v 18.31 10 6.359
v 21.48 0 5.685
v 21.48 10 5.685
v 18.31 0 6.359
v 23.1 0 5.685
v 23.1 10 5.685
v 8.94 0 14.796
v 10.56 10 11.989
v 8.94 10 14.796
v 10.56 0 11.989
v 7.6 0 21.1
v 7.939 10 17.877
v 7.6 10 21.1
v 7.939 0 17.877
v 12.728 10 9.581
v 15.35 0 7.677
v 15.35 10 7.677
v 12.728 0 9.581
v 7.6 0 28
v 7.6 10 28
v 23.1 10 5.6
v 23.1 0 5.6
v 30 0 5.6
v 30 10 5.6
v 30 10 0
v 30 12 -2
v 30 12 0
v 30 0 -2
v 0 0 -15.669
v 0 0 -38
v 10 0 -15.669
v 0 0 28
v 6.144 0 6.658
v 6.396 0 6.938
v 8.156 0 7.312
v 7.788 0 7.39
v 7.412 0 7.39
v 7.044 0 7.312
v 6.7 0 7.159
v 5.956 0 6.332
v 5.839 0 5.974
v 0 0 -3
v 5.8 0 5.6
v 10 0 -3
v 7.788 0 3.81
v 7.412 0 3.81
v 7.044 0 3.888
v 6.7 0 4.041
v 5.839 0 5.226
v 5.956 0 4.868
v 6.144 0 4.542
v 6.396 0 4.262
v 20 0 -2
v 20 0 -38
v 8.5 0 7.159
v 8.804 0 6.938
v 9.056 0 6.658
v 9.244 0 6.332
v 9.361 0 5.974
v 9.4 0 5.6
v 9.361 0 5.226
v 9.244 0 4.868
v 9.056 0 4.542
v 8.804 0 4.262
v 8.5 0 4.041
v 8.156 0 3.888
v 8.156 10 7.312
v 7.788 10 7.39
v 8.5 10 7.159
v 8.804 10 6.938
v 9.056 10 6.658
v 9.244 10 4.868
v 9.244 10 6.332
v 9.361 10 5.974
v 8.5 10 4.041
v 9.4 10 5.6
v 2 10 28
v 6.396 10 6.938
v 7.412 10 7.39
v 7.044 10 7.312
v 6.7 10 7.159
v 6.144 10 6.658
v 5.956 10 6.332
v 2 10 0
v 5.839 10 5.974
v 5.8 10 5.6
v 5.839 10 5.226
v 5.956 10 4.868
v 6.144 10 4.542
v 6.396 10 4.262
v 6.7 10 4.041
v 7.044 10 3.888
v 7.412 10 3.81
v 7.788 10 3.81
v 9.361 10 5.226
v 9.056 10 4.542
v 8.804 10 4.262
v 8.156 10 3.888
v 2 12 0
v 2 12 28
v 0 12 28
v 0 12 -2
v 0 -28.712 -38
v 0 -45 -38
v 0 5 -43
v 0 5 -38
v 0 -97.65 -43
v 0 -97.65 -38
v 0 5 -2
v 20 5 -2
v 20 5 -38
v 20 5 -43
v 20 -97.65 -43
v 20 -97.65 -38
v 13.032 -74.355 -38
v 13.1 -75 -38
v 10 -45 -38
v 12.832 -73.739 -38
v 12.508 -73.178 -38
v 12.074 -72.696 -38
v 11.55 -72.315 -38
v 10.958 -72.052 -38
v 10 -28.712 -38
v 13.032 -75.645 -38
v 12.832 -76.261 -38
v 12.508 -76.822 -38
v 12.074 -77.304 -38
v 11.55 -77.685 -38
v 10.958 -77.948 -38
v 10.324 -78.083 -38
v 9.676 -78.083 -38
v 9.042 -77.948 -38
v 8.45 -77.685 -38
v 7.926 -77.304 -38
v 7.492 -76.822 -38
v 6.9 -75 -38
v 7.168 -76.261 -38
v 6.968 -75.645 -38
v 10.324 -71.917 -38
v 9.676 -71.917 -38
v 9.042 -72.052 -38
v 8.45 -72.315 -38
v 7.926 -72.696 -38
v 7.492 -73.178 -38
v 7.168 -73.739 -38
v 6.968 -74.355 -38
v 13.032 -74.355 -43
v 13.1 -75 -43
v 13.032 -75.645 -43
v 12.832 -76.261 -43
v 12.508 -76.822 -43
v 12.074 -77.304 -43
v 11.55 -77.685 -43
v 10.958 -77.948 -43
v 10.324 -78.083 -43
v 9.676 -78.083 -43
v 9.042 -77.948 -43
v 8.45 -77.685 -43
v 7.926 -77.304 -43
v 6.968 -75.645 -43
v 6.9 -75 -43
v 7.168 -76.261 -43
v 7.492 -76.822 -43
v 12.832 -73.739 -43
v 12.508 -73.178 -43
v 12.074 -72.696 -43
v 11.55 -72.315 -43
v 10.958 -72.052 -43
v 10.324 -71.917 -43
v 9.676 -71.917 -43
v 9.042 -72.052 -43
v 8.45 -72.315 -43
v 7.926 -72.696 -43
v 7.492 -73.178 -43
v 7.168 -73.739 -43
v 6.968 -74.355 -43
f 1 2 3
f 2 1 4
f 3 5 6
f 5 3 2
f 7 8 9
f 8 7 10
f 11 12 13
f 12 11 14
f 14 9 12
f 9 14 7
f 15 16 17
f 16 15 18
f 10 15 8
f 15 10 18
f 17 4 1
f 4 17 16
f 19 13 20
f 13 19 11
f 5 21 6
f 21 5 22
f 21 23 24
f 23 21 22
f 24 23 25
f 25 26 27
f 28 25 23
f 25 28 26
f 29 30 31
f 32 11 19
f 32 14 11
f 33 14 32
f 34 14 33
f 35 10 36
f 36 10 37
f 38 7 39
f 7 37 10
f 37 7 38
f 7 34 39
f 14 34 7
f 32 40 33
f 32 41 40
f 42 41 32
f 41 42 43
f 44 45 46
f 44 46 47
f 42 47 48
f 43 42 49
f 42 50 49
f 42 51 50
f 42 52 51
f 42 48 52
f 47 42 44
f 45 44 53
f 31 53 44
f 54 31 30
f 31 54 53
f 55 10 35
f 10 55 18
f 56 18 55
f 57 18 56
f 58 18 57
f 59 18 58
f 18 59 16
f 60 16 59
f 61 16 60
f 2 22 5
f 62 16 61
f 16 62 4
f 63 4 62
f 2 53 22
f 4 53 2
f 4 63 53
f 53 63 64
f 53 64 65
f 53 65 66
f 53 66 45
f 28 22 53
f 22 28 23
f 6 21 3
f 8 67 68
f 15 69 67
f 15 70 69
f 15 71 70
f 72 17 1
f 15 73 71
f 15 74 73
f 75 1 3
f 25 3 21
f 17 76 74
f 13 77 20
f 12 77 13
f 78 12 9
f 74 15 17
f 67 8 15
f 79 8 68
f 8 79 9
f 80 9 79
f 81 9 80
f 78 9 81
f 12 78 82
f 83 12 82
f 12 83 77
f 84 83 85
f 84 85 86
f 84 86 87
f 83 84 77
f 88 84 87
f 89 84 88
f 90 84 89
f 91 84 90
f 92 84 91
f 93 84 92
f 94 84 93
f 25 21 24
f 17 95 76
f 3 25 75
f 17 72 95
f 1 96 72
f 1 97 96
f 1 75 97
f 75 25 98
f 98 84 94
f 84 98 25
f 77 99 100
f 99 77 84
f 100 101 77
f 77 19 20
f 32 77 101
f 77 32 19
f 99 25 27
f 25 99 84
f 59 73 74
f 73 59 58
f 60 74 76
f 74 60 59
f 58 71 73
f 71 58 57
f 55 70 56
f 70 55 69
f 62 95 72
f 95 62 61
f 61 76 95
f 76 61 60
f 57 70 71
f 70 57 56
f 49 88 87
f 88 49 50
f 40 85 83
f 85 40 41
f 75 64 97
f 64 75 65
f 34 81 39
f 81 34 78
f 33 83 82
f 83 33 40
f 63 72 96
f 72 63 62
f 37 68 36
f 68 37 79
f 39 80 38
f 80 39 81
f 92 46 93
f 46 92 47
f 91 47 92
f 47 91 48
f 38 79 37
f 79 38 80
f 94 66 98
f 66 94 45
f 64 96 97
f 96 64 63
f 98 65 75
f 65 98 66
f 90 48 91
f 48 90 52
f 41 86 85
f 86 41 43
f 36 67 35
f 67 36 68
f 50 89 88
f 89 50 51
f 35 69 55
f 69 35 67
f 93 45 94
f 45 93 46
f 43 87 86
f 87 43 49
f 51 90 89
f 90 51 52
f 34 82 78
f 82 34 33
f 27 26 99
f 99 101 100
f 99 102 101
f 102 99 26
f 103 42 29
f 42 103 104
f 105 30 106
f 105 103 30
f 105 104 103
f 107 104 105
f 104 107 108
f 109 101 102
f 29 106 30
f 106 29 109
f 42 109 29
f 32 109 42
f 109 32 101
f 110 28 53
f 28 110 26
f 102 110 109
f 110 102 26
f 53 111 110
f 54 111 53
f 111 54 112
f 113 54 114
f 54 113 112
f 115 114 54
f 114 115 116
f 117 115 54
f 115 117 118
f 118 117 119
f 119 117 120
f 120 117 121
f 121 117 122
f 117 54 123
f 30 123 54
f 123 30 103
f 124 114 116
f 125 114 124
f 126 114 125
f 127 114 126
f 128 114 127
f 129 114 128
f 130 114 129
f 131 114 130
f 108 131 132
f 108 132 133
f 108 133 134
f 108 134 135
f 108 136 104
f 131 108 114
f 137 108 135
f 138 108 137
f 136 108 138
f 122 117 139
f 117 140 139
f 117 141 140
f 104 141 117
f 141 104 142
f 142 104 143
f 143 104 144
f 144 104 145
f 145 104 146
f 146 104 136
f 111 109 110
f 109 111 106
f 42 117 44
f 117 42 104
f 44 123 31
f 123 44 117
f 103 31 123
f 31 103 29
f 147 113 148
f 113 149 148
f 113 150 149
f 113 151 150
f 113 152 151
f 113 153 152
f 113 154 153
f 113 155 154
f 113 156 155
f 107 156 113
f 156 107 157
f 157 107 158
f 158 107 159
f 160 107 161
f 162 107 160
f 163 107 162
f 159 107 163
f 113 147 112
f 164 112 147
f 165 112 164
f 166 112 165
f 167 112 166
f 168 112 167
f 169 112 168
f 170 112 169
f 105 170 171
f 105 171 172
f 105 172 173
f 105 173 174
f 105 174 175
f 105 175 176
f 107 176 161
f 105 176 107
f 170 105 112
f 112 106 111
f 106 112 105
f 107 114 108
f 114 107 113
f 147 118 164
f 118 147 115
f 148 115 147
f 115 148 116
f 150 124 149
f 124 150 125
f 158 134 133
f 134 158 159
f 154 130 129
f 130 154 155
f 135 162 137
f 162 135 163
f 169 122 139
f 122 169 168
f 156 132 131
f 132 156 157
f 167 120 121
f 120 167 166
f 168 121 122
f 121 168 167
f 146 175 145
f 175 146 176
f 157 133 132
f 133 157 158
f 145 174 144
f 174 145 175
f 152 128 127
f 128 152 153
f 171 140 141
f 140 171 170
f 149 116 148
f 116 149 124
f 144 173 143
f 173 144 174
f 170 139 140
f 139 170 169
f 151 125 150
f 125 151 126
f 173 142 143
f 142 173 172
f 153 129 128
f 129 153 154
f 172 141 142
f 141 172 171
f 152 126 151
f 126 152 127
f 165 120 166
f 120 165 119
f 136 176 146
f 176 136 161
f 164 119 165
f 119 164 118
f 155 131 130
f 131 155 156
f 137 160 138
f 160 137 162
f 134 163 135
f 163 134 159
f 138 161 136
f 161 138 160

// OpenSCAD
    // Axes correspond to the printer axes.

mm = 1;
$fs = 0.1;
epsilon = 0.01 * mm;

motor_screw_to_edge = 5.6 * mm;
motor_screw_clearance = 3.6 * mm;

motor_bracket_to_edge = 28 * mm;
motor_mount_thickness = 10 * mm;

motor_mount_lip_width = 2 * mm;
motor_mount_lip_height = 2 * mm;

motor_width = 42.2 * mm;
edge_to_shaft = motor_width / 2;
motor_shaft_clearance = 31 * mm;

motor_mount_total_width = motor_bracket_to_edge + motor_mount_lip_width;
motor_mount_total_thickness = motor_mount_thickness + motor_mount_lip_height;

motor_edge_to_lens = [ 0, -75, -10 ] * mm;
lens_to_base = [ 0, 0, -28 ] * mm;
// oops I should refactor this a bit
lens_to_base_x = -35 * mm;
mounting_screw_clearance = 6.2 * mm;

motor_to_camera_base = motor_edge_to_lens + lens_to_base;

camera_bracket_width = 20 * mm;
camera_bracket_thickness = 5 * mm;
camera_base_width = 45.3 * mm;
camera_lip = [ 6.2 * mm, camera_base_width, 7.5 * mm ];
brace_height = 35 * mm;
brace_length = 45 * mm;
brace_thickness = 10 * mm;

// Measurements for camera clearance
camera_total_width = 94 * mm;
camera_total_height = 43 * mm;
camera_total_depth = 25 * mm;
camera_overhang = 8 * mm;

module motor_mount()
{

    difference()
    {
        // Base shape
        cube([ motor_bracket_to_edge, motor_bracket_to_edge, motor_mount_thickness ]);

        // Cutout for motor shaft
        translate([ edge_to_shaft, edge_to_shaft, -epsilon ])
        {
            // Motor shaft clearance
            cylinder(h = motor_mount_thickness + 2 * epsilon, d = motor_shaft_clearance);

            // Additional cuts to make the cutout a rounded L-shape,
            // instead of a cut-off circle.
            translate([ -motor_shaft_clearance / 2, 0, 0 ])
                cube([ motor_shaft_clearance, motor_shaft_clearance / 2, motor_mount_thickness + 2 * epsilon ]);
            translate([ 0, -motor_shaft_clearance / 2, 0 ])
                cube([ motor_shaft_clearance / 2, motor_shaft_clearance, motor_mount_thickness + 2 * epsilon ]);
        }

        // Screw hole for mounting
        translate([ motor_screw_to_edge, motor_screw_to_edge, -epsilon ])
            cylinder(h = motor_mount_thickness + 2 * epsilon, d = motor_screw_clearance);
    }

    // Lip for alignment using edge of motor housing
    translate([ -motor_mount_lip_width, -motor_mount_lip_width, -motor_mount_lip_height ])
    {
        cube([ motor_mount_total_width, motor_mount_lip_width, motor_mount_total_thickness ]);
        cube([ motor_mount_lip_width, motor_mount_total_width, motor_mount_total_thickness ]);
    }
}

module brace()
{
    rotate([ 90, 0, -90 ]) linear_extrude(brace_thickness) polygon([
        [ brace_length, 0 ],
        [ 0, brace_height ],
        [ 0, brace_height - brace_thickness * sqrt(pow(brace_length, 2) + pow(brace_height, 2)) / brace_length ],
        [ brace_length - brace_thickness * sqrt(pow(brace_length, 2) + pow(brace_height, 2)) / brace_height, 0 ],
    ]);
}

module prusa_i3_x_camera()
{

    translate([ motor_mount_lip_width, motor_mount_thickness, 0 ]) rotate([ 90, 0, 0 ]) motor_mount();
    translate([ 0, 0, motor_to_camera_base[2] ])
    {
        cube([ camera_bracket_width, camera_bracket_thickness, abs(motor_to_camera_base[2]) ]);
        translate([ brace_thickness, 0, 0 ]) brace();
    }
    translate(motor_to_camera_base - [ 0, camera_base_width / 2, camera_bracket_thickness ])
    {
        difference()
        {
            cube([
                camera_bracket_width, abs(motor_to_camera_base[1]) + camera_base_width / 2 + camera_bracket_thickness,
                camera_bracket_thickness
            ]);
            translate([ camera_bracket_width / 2, camera_base_width / 2, -epsilon ])
                cylinder(d = mounting_screw_clearance, h = camera_bracket_thickness + 2 * epsilon);
        }
    }
}

module camera_model()
{
    translate(motor_to_camera_base +
              [ camera_bracket_width / 2 - lens_to_base_x - camera_total_depth, -camera_total_width / 2, 0 ])
        cube([ camera_total_depth, camera_total_width, camera_total_height ]);
}

prusa_i3_x_camera();
// camera_model();
